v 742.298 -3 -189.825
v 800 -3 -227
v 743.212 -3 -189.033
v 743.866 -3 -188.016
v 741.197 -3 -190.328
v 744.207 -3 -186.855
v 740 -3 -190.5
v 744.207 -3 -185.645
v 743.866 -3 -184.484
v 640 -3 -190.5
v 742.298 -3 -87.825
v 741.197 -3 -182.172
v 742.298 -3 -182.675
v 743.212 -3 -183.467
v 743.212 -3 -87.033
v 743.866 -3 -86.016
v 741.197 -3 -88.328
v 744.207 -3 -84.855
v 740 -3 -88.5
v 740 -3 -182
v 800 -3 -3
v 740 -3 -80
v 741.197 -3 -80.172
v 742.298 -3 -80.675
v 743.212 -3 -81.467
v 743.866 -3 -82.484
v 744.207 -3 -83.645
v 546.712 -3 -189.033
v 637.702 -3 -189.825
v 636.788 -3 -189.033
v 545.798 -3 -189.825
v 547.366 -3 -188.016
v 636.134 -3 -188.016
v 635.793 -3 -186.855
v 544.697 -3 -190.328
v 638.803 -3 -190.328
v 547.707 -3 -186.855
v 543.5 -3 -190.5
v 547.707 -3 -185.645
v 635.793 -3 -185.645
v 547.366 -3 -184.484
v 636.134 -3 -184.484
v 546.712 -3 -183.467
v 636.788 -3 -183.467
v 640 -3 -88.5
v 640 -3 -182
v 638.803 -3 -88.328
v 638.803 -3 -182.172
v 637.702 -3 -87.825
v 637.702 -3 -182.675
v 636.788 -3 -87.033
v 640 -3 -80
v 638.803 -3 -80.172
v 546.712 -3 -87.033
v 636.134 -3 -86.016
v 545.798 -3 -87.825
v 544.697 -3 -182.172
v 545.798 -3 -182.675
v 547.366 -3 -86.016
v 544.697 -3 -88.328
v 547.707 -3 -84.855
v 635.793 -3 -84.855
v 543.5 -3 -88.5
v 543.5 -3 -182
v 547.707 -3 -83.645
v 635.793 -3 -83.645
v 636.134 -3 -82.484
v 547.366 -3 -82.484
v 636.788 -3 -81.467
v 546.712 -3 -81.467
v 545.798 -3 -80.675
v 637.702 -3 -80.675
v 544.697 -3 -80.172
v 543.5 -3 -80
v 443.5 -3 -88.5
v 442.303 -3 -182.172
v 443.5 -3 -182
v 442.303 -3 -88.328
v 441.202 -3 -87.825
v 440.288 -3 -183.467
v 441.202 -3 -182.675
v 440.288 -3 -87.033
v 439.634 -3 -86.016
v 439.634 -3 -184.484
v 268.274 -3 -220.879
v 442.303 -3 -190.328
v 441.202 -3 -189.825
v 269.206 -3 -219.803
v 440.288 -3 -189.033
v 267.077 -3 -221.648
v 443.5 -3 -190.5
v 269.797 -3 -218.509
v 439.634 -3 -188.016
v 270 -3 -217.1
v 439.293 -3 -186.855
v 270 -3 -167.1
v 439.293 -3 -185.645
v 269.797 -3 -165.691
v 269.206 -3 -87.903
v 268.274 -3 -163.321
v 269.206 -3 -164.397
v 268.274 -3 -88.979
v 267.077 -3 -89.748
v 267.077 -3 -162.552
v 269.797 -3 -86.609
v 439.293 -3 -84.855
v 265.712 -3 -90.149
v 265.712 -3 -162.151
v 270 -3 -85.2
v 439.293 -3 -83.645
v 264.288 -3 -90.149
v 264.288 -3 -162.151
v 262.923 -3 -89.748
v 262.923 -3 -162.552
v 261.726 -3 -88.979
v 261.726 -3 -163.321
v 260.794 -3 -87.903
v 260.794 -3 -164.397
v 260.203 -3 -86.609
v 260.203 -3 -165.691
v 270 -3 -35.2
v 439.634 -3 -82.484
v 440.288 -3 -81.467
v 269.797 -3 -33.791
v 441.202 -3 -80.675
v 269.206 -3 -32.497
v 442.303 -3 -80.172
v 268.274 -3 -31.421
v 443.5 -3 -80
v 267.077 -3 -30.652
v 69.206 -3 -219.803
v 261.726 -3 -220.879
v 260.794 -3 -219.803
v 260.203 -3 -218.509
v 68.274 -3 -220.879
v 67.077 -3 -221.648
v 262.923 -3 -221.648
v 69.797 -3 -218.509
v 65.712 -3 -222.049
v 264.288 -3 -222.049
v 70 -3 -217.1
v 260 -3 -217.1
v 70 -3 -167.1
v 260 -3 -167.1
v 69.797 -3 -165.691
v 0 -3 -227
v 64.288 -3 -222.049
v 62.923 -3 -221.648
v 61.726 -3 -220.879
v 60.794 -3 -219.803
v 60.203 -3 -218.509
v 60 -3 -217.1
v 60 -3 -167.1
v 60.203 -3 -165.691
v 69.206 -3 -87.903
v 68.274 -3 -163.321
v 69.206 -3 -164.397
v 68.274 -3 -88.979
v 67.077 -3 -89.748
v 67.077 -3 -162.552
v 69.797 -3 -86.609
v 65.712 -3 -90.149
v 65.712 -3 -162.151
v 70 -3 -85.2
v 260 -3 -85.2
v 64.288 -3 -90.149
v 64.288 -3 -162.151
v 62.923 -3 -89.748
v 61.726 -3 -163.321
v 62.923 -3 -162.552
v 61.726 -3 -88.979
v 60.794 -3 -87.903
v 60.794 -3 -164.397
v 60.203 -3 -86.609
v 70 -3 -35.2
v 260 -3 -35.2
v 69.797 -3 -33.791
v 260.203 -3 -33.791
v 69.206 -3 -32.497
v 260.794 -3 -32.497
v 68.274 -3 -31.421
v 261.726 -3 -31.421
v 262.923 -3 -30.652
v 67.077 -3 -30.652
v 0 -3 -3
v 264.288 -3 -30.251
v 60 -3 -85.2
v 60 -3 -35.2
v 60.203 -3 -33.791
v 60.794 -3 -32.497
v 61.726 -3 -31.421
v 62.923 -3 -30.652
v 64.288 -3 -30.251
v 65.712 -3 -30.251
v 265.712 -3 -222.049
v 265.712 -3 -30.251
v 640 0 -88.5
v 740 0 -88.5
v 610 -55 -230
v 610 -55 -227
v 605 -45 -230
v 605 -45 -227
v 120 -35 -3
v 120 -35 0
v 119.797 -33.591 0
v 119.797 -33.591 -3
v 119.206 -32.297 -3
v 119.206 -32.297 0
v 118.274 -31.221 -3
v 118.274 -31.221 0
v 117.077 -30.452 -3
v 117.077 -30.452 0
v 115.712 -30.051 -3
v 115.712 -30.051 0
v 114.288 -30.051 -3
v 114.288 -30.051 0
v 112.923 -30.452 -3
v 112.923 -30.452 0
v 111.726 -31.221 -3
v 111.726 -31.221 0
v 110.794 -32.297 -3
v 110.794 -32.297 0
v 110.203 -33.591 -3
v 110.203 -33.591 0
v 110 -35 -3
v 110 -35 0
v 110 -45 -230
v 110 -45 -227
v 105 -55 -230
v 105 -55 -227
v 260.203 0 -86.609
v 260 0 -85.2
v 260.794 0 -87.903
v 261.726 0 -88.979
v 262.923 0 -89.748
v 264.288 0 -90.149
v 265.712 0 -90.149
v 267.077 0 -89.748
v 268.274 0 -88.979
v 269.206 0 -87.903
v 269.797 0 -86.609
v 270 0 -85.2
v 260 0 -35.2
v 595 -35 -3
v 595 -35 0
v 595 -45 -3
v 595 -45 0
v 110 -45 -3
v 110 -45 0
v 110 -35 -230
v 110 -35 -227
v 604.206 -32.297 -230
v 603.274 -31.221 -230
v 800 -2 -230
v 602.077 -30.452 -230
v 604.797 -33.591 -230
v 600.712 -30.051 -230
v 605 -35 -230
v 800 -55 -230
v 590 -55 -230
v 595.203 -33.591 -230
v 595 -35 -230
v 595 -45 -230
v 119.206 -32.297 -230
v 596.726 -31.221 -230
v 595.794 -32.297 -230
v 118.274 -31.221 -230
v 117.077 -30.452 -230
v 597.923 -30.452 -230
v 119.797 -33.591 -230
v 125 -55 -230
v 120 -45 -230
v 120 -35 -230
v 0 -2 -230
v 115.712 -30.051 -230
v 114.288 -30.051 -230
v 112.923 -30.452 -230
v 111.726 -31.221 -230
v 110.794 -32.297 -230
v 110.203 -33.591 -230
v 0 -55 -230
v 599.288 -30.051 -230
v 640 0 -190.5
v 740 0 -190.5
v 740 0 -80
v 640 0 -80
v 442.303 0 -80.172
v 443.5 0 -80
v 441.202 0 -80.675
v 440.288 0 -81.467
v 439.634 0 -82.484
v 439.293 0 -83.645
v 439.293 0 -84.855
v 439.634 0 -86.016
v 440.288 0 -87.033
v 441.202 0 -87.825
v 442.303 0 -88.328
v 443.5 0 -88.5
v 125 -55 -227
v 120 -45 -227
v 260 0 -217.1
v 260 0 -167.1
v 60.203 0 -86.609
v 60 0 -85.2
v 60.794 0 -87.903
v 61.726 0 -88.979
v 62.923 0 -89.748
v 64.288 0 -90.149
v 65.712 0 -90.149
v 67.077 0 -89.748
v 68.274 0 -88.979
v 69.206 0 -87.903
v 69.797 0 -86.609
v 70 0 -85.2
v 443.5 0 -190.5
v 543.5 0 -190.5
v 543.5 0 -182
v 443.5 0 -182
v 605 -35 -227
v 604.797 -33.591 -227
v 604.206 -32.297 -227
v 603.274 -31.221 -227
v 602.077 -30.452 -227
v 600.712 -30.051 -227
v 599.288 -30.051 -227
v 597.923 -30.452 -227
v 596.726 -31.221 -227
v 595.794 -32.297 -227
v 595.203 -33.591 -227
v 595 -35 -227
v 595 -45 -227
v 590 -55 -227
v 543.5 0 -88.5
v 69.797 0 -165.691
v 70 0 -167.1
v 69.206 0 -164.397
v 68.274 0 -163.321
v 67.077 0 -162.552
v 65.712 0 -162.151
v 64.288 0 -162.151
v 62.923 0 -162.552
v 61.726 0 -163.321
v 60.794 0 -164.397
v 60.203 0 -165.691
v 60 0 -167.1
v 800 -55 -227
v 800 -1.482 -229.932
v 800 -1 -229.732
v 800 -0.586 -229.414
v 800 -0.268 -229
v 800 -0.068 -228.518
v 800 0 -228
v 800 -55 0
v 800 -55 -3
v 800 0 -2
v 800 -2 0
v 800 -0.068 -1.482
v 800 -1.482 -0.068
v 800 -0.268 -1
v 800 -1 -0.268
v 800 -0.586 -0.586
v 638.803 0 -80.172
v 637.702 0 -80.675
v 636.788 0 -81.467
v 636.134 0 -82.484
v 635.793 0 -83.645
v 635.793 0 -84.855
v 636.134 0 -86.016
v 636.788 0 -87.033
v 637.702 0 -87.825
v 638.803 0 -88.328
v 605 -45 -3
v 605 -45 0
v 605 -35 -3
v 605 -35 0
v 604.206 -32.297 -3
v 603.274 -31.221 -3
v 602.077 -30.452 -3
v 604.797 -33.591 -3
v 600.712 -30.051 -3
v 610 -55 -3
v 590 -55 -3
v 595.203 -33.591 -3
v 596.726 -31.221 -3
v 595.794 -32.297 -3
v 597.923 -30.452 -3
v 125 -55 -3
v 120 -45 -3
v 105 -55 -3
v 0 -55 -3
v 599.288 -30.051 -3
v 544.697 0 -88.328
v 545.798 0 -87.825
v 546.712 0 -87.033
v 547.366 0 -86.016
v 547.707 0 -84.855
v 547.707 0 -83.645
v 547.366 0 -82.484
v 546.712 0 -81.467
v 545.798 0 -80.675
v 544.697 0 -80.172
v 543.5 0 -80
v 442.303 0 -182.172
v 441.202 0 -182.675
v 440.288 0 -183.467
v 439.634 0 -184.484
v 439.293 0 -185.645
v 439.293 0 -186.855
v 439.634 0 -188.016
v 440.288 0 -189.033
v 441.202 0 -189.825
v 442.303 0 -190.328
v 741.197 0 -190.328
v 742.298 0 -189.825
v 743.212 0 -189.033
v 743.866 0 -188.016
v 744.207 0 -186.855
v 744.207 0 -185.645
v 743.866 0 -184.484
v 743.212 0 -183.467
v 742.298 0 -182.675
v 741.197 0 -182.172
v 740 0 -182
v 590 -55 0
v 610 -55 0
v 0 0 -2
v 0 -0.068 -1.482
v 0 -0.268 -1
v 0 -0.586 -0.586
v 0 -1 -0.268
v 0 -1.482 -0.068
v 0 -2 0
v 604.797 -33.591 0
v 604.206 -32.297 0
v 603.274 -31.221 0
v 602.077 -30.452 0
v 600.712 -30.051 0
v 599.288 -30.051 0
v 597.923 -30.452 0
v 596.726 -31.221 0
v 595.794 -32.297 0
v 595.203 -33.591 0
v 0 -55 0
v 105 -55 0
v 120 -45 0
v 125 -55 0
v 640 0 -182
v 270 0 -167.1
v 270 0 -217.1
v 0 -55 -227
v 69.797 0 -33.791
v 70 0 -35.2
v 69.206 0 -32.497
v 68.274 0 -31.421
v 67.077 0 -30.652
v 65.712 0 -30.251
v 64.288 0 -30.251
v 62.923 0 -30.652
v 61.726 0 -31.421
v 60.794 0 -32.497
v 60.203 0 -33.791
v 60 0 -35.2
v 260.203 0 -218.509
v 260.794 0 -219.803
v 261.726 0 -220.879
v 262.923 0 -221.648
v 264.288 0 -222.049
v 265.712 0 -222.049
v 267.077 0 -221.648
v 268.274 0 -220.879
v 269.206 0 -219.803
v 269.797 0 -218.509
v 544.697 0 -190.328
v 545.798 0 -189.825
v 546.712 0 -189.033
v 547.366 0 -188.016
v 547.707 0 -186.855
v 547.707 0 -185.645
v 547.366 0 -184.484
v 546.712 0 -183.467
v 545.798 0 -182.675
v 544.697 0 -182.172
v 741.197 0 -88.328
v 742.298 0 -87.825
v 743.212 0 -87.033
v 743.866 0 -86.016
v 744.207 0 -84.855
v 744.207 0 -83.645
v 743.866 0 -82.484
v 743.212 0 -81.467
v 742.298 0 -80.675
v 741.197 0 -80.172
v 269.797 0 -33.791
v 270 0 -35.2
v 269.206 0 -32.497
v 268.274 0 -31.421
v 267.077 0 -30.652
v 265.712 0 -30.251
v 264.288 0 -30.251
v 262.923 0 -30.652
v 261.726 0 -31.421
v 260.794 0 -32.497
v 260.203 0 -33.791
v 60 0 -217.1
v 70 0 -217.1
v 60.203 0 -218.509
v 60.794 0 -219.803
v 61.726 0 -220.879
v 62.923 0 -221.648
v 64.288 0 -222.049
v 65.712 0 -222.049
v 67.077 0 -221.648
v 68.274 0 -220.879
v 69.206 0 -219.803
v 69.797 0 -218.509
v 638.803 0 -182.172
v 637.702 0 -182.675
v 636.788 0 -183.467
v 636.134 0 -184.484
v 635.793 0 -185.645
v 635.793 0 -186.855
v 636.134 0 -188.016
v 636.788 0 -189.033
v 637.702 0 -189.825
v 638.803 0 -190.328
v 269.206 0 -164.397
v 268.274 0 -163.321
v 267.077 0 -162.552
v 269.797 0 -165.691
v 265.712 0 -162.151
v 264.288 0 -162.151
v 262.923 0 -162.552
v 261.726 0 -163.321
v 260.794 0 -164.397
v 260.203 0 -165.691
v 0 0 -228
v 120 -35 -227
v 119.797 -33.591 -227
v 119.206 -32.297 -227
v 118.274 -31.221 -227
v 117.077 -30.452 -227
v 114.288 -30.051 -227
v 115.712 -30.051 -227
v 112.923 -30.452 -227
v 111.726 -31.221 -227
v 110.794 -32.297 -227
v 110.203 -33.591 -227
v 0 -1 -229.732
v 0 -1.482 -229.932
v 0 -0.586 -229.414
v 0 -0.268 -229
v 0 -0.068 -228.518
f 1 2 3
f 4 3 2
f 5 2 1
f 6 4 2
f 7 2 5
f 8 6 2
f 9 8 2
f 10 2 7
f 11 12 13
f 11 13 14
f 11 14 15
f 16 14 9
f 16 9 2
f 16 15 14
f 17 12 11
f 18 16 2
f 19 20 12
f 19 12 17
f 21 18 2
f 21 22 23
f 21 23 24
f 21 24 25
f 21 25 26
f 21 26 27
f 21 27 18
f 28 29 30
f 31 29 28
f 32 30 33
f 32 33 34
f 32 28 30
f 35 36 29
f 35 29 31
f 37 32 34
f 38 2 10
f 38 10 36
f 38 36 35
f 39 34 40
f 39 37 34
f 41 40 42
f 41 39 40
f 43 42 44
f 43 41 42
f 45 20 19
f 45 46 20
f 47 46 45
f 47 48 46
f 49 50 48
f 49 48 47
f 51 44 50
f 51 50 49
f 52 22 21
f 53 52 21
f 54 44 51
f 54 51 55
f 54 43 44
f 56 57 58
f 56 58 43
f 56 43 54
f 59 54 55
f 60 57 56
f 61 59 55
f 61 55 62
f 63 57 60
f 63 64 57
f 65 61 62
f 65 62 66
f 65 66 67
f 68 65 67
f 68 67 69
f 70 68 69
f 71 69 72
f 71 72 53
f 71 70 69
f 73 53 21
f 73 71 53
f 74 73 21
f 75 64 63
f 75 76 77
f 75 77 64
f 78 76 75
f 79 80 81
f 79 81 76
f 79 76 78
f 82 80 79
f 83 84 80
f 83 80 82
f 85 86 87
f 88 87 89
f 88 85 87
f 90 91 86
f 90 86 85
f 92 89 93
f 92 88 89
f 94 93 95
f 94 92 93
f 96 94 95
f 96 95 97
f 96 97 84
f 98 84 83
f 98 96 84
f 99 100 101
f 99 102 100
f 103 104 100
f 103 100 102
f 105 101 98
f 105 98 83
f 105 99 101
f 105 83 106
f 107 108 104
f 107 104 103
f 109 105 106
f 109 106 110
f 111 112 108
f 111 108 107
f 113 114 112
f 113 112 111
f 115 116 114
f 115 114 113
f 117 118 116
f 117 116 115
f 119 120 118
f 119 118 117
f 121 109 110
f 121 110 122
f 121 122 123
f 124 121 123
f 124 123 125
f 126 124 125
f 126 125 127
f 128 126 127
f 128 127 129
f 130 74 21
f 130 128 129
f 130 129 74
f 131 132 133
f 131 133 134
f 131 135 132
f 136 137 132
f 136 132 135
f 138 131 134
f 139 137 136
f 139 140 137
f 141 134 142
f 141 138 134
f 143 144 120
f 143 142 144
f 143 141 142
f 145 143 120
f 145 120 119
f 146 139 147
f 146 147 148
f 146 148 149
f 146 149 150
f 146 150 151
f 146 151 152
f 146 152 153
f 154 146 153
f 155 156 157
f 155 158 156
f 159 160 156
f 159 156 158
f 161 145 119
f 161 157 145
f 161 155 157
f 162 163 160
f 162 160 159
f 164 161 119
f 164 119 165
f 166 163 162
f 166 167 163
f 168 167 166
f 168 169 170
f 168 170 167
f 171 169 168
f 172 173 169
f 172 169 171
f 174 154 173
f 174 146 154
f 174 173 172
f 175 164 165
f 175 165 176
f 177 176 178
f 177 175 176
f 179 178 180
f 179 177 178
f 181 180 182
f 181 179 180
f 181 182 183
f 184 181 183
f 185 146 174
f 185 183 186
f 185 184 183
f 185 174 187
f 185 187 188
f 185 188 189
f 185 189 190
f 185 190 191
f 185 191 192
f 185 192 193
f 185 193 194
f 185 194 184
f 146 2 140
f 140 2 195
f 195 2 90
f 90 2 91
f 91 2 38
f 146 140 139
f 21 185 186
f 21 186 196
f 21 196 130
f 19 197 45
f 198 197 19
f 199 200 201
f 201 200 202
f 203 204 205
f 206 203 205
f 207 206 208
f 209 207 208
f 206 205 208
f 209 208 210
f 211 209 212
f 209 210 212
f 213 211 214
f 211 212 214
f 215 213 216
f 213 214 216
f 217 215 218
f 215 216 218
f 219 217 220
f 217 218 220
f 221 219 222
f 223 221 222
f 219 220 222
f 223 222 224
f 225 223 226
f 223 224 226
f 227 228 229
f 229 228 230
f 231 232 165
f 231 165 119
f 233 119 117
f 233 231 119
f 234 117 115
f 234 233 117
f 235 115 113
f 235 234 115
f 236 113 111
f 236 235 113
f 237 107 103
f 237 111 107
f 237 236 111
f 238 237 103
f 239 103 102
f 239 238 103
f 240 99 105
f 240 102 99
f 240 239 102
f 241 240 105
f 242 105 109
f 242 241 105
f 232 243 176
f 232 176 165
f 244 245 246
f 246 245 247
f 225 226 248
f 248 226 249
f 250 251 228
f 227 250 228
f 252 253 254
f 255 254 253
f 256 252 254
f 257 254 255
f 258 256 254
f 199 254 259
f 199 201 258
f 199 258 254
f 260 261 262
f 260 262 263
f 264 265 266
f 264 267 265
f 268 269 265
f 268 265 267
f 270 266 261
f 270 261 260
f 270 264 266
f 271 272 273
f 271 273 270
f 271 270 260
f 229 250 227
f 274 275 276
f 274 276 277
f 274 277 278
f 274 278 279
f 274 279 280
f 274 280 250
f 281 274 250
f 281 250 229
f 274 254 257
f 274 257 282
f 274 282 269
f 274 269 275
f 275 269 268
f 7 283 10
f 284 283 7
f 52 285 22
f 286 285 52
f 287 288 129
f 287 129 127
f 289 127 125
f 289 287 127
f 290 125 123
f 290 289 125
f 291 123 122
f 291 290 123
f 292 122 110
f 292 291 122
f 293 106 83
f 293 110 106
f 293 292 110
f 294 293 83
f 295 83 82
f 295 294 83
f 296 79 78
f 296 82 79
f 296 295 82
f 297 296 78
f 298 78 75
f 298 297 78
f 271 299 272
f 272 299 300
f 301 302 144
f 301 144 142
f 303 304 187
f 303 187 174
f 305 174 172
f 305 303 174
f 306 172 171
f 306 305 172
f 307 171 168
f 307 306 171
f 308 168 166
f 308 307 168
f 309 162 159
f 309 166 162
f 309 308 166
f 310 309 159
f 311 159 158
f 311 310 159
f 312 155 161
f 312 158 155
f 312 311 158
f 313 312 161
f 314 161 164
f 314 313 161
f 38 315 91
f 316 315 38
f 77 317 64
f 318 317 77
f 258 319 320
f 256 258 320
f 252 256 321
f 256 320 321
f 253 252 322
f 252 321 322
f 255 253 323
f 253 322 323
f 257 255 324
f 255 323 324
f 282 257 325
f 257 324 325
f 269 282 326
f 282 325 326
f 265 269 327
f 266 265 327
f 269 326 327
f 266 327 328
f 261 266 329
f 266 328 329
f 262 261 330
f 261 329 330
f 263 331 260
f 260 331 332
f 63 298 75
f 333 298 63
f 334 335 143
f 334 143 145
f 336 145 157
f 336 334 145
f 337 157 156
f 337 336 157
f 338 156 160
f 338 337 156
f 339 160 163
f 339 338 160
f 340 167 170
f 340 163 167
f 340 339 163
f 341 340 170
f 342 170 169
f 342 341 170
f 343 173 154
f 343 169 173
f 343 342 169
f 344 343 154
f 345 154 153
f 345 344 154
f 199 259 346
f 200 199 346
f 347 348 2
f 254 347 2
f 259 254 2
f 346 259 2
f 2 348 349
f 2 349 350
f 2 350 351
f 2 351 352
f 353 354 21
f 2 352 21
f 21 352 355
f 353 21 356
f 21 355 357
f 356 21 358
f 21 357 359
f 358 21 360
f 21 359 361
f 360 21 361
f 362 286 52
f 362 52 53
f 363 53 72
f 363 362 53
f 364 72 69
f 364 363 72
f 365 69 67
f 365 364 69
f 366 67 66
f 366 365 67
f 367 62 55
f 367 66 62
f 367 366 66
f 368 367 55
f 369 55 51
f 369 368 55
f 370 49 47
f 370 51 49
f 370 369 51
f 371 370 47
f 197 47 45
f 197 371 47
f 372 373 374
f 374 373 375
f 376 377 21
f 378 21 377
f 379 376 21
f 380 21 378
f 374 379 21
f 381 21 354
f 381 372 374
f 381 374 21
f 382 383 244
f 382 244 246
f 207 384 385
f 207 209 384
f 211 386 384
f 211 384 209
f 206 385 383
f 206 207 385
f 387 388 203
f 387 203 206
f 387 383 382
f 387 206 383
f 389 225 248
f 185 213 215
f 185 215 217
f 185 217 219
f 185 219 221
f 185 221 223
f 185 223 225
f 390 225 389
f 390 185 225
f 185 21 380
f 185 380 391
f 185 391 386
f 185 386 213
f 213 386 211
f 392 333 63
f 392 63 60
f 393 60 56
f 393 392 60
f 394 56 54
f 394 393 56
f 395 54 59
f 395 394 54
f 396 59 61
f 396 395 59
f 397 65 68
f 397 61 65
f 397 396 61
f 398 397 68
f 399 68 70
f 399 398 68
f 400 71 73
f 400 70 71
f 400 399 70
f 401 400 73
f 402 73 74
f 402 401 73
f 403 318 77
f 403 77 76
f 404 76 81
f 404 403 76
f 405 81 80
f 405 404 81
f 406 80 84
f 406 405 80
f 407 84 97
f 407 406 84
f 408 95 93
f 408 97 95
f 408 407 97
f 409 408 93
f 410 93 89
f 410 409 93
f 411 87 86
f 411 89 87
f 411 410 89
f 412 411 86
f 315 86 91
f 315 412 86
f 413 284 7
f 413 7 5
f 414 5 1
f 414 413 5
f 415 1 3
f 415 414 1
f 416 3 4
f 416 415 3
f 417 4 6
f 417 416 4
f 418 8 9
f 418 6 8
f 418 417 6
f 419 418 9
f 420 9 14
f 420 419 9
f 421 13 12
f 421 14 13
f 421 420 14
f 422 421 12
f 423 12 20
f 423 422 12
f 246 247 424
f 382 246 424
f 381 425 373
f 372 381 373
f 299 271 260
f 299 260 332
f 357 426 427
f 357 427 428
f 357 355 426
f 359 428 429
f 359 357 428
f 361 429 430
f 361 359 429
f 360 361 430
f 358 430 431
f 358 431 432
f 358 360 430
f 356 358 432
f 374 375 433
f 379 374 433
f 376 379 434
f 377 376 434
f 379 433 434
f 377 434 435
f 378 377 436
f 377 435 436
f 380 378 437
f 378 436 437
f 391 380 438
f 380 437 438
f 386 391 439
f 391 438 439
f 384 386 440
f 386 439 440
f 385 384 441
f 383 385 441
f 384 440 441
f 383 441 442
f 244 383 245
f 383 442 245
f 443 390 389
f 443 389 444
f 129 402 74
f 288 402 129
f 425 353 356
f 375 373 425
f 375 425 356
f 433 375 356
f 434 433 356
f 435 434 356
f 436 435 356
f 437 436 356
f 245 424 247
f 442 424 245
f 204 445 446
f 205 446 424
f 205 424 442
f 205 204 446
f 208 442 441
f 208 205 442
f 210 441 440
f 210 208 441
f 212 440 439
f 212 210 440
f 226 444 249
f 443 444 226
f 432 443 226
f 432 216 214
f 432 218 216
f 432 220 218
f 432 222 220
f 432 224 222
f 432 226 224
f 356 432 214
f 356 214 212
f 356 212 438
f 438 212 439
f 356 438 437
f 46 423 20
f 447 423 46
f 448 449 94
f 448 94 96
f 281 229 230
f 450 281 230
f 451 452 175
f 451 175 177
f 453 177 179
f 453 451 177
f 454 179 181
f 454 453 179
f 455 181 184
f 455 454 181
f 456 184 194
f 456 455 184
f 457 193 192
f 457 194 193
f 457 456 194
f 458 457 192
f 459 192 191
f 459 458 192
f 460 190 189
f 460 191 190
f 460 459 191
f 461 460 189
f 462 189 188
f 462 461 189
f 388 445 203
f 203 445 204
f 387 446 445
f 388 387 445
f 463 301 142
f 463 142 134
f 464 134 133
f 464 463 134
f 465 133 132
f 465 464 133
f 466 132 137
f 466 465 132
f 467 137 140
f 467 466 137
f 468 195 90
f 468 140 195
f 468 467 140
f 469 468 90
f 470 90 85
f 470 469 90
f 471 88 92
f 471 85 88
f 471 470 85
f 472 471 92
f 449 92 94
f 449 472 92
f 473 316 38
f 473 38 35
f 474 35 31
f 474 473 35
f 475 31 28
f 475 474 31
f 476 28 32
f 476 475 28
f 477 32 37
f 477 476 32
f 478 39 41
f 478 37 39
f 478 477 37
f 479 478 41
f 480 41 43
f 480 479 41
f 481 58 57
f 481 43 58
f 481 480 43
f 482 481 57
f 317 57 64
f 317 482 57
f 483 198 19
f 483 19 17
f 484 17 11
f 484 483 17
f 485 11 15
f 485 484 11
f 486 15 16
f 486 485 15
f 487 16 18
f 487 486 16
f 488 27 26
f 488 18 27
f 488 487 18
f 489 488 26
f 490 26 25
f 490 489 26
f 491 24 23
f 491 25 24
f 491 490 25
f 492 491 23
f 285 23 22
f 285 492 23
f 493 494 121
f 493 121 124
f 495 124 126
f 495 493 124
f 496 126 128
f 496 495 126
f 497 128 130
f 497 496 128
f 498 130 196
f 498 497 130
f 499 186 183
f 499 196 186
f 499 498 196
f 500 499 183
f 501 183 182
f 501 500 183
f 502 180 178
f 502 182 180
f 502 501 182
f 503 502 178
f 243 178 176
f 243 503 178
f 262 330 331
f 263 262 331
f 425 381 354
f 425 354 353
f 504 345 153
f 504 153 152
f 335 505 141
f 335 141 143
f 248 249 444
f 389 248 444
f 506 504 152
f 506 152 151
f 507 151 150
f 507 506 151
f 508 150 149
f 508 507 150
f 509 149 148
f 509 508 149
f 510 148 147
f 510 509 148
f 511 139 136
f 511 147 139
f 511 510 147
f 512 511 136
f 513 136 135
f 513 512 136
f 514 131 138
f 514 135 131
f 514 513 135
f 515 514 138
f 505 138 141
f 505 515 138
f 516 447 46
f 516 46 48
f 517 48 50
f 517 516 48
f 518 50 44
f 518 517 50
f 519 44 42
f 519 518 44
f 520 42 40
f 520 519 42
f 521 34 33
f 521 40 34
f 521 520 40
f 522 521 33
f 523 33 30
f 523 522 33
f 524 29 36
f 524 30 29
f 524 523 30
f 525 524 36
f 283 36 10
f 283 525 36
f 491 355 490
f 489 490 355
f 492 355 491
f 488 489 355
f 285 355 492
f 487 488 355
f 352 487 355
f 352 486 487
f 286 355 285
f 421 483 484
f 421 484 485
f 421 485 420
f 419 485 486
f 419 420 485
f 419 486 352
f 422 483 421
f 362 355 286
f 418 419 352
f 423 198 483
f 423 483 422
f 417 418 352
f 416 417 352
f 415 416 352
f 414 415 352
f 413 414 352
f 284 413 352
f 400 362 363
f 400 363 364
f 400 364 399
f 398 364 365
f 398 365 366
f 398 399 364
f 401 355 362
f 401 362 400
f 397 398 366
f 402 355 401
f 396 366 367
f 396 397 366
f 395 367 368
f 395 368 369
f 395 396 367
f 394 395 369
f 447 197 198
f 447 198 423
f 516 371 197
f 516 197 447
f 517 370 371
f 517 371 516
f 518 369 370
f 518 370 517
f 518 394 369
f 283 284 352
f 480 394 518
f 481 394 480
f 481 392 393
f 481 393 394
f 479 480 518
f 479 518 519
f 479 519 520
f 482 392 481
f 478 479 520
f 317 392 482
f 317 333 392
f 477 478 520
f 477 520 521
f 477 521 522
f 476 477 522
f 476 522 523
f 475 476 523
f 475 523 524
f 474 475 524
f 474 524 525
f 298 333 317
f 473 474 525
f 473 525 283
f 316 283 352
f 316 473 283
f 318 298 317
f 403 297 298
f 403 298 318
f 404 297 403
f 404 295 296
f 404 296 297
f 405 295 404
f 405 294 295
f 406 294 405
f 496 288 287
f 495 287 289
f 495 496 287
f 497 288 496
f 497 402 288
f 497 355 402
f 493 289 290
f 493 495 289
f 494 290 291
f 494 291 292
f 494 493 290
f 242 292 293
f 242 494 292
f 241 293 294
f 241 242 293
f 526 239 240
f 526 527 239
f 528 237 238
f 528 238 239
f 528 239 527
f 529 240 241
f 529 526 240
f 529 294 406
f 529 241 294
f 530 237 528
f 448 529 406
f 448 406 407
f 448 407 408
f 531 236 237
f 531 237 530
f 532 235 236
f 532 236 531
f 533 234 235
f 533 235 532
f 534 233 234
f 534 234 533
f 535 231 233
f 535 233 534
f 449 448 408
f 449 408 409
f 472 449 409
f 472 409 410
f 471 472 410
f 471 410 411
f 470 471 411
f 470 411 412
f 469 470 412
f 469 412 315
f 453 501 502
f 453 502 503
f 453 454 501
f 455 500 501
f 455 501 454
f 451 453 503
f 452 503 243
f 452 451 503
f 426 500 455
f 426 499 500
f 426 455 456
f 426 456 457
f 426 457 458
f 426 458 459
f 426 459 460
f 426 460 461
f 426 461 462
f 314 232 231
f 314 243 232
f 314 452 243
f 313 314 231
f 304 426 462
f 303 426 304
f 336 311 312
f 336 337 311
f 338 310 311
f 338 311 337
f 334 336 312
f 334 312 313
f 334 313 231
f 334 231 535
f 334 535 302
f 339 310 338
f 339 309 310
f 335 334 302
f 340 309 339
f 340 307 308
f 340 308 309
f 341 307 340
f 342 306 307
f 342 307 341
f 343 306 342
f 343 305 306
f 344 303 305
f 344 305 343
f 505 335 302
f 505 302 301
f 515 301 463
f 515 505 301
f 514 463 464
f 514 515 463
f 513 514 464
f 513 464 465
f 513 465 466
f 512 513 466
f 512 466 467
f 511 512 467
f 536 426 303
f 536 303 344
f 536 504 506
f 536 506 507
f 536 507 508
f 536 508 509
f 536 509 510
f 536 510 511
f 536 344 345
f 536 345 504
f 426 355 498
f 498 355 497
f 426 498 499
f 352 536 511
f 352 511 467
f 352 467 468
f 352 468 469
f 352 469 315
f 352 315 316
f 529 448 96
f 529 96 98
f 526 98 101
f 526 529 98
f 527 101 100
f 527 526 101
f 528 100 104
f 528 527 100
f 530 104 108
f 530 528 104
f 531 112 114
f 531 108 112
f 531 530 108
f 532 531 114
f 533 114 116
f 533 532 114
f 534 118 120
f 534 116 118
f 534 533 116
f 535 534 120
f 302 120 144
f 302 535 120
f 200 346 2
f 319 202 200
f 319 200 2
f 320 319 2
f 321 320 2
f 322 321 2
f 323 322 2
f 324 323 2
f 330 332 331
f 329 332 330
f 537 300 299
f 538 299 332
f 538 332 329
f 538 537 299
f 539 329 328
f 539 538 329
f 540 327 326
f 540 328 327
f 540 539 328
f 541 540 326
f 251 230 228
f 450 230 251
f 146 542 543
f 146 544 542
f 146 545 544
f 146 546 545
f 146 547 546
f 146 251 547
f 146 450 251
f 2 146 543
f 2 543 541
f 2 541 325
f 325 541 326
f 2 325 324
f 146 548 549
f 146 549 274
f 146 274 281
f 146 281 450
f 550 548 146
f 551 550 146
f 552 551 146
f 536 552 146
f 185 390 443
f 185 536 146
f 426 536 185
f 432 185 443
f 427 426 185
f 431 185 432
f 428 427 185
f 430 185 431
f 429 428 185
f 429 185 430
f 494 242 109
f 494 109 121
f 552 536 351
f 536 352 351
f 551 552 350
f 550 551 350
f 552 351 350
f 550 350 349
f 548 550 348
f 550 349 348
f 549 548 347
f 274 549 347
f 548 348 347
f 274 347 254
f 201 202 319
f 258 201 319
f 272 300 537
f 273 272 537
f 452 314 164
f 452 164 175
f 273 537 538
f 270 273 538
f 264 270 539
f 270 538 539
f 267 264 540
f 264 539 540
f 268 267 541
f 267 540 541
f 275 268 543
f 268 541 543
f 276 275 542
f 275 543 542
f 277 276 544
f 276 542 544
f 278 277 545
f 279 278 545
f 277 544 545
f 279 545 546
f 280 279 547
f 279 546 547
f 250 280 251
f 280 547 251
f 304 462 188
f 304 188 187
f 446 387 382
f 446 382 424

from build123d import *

# Parameters (mm, degrees)
BOSS_EXTRU_1_DEPTH      = 800
ENL_V_MAT_EXTRU_1_DEPTH = 30
ENL_V_MAT_EXTRU_2_DEPTH = 30
ENL_V_MAT_EXTRU_4_DEPTH = 300
CONG_1_R                = 2


with BuildPart() as part:
    # Esquisse1 → Boss.-Extru.1 (new body)
    with BuildSketch(Plane(origin=(0, 0, 0), x_dir=(0, 0, -1), z_dir=(1, 0, 0))):
        Polygon((0, 0), (230, 0), (230, -55), (227, -55), (227, -3), (3, -3), (3, -55), (0, -55), align=None)
    extrude(amount=BOSS_EXTRU_1_DEPTH)

    # Esquisse2 → Enlèv. mat.-Extru.1 (cut)
    with BuildSketch(Plane(origin=(0, 0, 0), x_dir=(1, 0, 0), z_dir=(0, 1, 0))):
        with BuildLine():
            Line((443.5, 190.5), (543.5, 190.5))
            ThreePointArc((543.5, 190.5), (547.75, 186.25), (543.5, 182))
            Line((543.5, 182), (443.5, 182))
            ThreePointArc((443.5, 182), (439.25, 186.25), (443.5, 190.5))
        make_face()
        with BuildLine():
            Line((640, 190.5), (740, 190.5))
            ThreePointArc((740, 190.5), (744.25, 186.25), (740, 182))
            Line((740, 182), (640, 182))
            ThreePointArc((640, 182), (635.75, 186.25), (640, 190.5))
        make_face()
        with BuildLine():
            Line((443.5, 88.5), (543.5, 88.5))
            ThreePointArc((543.5, 88.5), (547.75, 84.25), (543.5, 80))
            Line((543.5, 80), (443.5, 80))
            ThreePointArc((443.5, 80), (439.25, 84.25), (443.5, 88.5))
        make_face()
        with BuildLine():
            Line((640, 88.5), (740, 88.5))
            ThreePointArc((740, 88.5), (744.25, 84.25), (740, 80))
            Line((740, 80), (640, 80))
            ThreePointArc((640, 80), (635.75, 84.25), (640, 88.5))
        make_face()
    extrude(amount=-ENL_V_MAT_EXTRU_1_DEPTH, mode=Mode.SUBTRACT)

    # Esquisse3 → Enlèv. mat.-Extru.2 (cut)
    with BuildSketch(Plane(origin=(0, 0, 0), x_dir=(1, 0, 0), z_dir=(0, 1, 0))):
        with BuildLine():
            Line((70, 217.1), (70, 167.1))
            ThreePointArc((70, 167.1), (65, 162.1), (60, 167.1))
            Line((60, 167.1), (60, 217.1))
            ThreePointArc((60, 217.1), (65, 222.1), (70, 217.1))
        make_face()
        with BuildLine():
            Line((270, 217.1), (270, 167.1))
            ThreePointArc((270, 167.1), (265, 162.1), (260, 167.1))
            Line((260, 167.1), (260, 217.1))
            ThreePointArc((260, 217.1), (265, 222.1), (270, 217.1))
        make_face()
        with BuildLine():
            Line((270, 85.2), (270, 35.2))
            ThreePointArc((270, 35.2), (265, 30.2), (260, 35.2))
            Line((260, 35.2), (260, 85.2))
            ThreePointArc((260, 85.2), (265, 90.2), (270, 85.2))
        make_face()
        with BuildLine():
            Line((60, 35.2), (60, 85.2))
            ThreePointArc((60, 85.2), (65, 90.2), (70, 85.2))
            Line((70, 85.2), (70, 35.2))
            ThreePointArc((70, 35.2), (65, 30.2), (60, 35.2))
        make_face()
    extrude(amount=-ENL_V_MAT_EXTRU_2_DEPTH, mode=Mode.SUBTRACT)

    # Esquisse6 → Enlèv. mat.-Extru.4 (cut)
    with BuildSketch(Plane.XY):
        with BuildLine():
            Line((595, -55), (605, -55))
            Line((605, -55), (610, -55))
            Line((610, -55), (605, -45))
            Line((605, -45), (605, -35))
            ThreePointArc((605, -35), (600, -30), (595, -35))
            Line((595, -35), (595, -45))
            Line((595, -45), (590, -55))
            Line((590, -55), (595, -55))
        make_face()
        with BuildLine():
            Line((110, -45), (105, -55))
            Line((105, -55), (110, -55))
            Line((110, -55), (120, -55))
            Line((120, -55), (125, -55))
            Line((125, -55), (120, -45))
            Line((120, -45), (120, -35))
            ThreePointArc((120, -35), (115, -30), (110, -35))
            Line((110, -35), (110, -45))
        make_face()
    extrude(amount=-ENL_V_MAT_EXTRU_4_DEPTH, mode=Mode.SUBTRACT)

    # Congé1
    cong_1_edges = [part.edges().sort_by_distance(p)[0] for p in [
        (400, 0, 0),
        (400, 0, -230),
    ]]
    fillet(cong_1_edges, radius=CONG_1_R)


solid = part.part
